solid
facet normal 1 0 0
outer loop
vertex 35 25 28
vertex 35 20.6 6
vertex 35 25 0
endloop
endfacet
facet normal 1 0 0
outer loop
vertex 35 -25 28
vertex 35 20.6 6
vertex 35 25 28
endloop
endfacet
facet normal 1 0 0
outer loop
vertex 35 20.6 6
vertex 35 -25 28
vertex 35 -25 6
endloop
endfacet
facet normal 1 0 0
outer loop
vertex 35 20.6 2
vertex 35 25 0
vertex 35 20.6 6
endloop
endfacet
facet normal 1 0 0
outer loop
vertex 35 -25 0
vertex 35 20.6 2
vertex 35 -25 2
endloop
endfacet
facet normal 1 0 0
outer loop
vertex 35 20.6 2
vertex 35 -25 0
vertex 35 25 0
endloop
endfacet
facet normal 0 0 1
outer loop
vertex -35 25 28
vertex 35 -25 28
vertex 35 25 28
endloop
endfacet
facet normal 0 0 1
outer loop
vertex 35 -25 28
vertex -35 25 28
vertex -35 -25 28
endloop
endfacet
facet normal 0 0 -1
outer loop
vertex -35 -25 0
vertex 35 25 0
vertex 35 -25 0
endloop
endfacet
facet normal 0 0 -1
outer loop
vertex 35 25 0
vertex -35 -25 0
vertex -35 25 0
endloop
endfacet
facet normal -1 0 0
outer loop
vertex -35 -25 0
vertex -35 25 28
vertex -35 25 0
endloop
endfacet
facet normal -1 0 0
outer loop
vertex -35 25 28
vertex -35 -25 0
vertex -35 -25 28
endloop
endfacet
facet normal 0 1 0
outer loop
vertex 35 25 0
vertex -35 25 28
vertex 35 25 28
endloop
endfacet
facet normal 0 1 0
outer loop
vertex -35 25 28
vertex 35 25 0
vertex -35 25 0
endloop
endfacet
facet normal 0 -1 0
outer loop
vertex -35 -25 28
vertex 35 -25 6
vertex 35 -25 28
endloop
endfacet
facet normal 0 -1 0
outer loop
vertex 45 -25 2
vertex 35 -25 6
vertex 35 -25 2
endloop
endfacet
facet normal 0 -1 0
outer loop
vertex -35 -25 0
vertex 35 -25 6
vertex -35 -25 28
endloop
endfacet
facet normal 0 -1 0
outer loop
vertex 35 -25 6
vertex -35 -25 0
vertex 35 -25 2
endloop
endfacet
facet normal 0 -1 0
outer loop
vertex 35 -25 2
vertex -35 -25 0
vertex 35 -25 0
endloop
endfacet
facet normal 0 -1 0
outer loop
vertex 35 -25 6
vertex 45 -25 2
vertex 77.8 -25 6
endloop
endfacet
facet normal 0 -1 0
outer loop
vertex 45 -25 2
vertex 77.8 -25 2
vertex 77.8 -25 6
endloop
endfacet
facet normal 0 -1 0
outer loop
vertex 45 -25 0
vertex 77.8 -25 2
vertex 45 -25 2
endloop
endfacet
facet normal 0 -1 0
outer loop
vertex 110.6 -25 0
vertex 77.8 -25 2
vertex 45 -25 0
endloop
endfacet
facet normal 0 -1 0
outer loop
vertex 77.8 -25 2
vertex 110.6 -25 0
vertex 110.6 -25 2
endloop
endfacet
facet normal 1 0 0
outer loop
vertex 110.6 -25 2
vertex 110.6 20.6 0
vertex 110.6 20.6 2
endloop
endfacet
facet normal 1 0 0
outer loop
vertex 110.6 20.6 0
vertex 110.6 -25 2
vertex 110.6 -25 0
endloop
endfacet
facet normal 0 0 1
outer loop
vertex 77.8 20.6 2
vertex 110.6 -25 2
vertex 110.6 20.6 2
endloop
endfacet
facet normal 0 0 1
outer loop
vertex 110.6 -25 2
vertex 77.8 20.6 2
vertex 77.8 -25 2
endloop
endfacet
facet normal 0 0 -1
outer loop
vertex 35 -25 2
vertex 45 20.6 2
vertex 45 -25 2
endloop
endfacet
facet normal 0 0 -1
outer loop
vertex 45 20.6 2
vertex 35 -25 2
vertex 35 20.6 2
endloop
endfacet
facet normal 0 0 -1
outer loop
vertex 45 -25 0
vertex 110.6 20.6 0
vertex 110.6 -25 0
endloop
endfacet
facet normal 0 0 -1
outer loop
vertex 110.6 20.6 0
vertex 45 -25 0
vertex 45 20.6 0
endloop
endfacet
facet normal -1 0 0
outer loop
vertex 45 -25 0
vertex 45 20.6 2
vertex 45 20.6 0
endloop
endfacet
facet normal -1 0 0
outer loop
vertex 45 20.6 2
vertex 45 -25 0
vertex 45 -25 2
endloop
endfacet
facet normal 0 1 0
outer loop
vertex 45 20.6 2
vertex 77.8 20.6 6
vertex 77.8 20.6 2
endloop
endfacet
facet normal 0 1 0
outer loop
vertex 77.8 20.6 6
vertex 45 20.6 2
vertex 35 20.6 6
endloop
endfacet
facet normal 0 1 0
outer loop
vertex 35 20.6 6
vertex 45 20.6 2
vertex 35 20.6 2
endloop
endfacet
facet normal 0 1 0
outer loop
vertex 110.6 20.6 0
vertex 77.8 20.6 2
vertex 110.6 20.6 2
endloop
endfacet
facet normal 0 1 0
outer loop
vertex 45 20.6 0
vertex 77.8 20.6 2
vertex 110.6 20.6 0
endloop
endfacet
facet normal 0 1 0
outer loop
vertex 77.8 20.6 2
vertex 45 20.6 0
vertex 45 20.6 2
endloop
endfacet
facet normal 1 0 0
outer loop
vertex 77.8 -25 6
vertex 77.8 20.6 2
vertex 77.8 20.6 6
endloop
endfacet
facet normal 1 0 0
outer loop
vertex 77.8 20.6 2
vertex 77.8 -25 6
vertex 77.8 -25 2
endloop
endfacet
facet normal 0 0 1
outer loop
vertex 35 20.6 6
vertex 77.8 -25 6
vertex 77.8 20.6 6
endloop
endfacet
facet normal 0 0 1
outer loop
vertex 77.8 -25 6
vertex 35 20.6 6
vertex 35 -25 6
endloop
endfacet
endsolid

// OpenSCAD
// Two-part enclosure for a small electronics board (e.g. Arduino-based temperature logger)
// Print orientation: both parts flat on the bed, side by side along X

// ---------------- Parameters ----------------
box_x      = 70;    // box outer size in X (mm)
box_y      = 50;    // box outer size in Y (mm)
box_z      = 30;    // box outer size in Z (mm)
box_wall   = 2;     // box wall thickness (mm)
box_floor  = 2;     // box floor thickness (mm)

lip_t      = 1.5;   // lid lip wall thickness (mm)
lip_h      = 4;     // lid lip height above plate (mm)
lip_x      = 65.6;  // lip outer size in X (mm)
lip_y      = 45.6;  // lip outer size in Y (mm)

eps        = 0.01;  // small overlap to avoid coplanar faces (mm)
gap        = 10;    // gap between box and lid on the bed (mm)

// Derived
box_inner_x = box_x - 2 * box_wall;
box_inner_y = box_y - 2 * box_wall;
plate_t     = 2;    // lid plate thickness (mm)

// ---------------- Model ----------------
union() {
    // Part 1: Box, open top
    translate([-box_x / 2, -box_y / 2, 0])
        cube([box_x, box_y, box_z - box_floor]);

    // Part 2: Lid, printed upside down
    translate([box_x / 2 + gap, -box_y / 2, 0])
        cube([lip_x, lip_y, plate_t]);

    // Lip on top of the lid plate, sliding into the box opening
    translate([box_x / 2 + gap - lip_x / 2, -box_y / 2, plate_t])
        cube([lip_x, lip_y, lip_h]);
}
